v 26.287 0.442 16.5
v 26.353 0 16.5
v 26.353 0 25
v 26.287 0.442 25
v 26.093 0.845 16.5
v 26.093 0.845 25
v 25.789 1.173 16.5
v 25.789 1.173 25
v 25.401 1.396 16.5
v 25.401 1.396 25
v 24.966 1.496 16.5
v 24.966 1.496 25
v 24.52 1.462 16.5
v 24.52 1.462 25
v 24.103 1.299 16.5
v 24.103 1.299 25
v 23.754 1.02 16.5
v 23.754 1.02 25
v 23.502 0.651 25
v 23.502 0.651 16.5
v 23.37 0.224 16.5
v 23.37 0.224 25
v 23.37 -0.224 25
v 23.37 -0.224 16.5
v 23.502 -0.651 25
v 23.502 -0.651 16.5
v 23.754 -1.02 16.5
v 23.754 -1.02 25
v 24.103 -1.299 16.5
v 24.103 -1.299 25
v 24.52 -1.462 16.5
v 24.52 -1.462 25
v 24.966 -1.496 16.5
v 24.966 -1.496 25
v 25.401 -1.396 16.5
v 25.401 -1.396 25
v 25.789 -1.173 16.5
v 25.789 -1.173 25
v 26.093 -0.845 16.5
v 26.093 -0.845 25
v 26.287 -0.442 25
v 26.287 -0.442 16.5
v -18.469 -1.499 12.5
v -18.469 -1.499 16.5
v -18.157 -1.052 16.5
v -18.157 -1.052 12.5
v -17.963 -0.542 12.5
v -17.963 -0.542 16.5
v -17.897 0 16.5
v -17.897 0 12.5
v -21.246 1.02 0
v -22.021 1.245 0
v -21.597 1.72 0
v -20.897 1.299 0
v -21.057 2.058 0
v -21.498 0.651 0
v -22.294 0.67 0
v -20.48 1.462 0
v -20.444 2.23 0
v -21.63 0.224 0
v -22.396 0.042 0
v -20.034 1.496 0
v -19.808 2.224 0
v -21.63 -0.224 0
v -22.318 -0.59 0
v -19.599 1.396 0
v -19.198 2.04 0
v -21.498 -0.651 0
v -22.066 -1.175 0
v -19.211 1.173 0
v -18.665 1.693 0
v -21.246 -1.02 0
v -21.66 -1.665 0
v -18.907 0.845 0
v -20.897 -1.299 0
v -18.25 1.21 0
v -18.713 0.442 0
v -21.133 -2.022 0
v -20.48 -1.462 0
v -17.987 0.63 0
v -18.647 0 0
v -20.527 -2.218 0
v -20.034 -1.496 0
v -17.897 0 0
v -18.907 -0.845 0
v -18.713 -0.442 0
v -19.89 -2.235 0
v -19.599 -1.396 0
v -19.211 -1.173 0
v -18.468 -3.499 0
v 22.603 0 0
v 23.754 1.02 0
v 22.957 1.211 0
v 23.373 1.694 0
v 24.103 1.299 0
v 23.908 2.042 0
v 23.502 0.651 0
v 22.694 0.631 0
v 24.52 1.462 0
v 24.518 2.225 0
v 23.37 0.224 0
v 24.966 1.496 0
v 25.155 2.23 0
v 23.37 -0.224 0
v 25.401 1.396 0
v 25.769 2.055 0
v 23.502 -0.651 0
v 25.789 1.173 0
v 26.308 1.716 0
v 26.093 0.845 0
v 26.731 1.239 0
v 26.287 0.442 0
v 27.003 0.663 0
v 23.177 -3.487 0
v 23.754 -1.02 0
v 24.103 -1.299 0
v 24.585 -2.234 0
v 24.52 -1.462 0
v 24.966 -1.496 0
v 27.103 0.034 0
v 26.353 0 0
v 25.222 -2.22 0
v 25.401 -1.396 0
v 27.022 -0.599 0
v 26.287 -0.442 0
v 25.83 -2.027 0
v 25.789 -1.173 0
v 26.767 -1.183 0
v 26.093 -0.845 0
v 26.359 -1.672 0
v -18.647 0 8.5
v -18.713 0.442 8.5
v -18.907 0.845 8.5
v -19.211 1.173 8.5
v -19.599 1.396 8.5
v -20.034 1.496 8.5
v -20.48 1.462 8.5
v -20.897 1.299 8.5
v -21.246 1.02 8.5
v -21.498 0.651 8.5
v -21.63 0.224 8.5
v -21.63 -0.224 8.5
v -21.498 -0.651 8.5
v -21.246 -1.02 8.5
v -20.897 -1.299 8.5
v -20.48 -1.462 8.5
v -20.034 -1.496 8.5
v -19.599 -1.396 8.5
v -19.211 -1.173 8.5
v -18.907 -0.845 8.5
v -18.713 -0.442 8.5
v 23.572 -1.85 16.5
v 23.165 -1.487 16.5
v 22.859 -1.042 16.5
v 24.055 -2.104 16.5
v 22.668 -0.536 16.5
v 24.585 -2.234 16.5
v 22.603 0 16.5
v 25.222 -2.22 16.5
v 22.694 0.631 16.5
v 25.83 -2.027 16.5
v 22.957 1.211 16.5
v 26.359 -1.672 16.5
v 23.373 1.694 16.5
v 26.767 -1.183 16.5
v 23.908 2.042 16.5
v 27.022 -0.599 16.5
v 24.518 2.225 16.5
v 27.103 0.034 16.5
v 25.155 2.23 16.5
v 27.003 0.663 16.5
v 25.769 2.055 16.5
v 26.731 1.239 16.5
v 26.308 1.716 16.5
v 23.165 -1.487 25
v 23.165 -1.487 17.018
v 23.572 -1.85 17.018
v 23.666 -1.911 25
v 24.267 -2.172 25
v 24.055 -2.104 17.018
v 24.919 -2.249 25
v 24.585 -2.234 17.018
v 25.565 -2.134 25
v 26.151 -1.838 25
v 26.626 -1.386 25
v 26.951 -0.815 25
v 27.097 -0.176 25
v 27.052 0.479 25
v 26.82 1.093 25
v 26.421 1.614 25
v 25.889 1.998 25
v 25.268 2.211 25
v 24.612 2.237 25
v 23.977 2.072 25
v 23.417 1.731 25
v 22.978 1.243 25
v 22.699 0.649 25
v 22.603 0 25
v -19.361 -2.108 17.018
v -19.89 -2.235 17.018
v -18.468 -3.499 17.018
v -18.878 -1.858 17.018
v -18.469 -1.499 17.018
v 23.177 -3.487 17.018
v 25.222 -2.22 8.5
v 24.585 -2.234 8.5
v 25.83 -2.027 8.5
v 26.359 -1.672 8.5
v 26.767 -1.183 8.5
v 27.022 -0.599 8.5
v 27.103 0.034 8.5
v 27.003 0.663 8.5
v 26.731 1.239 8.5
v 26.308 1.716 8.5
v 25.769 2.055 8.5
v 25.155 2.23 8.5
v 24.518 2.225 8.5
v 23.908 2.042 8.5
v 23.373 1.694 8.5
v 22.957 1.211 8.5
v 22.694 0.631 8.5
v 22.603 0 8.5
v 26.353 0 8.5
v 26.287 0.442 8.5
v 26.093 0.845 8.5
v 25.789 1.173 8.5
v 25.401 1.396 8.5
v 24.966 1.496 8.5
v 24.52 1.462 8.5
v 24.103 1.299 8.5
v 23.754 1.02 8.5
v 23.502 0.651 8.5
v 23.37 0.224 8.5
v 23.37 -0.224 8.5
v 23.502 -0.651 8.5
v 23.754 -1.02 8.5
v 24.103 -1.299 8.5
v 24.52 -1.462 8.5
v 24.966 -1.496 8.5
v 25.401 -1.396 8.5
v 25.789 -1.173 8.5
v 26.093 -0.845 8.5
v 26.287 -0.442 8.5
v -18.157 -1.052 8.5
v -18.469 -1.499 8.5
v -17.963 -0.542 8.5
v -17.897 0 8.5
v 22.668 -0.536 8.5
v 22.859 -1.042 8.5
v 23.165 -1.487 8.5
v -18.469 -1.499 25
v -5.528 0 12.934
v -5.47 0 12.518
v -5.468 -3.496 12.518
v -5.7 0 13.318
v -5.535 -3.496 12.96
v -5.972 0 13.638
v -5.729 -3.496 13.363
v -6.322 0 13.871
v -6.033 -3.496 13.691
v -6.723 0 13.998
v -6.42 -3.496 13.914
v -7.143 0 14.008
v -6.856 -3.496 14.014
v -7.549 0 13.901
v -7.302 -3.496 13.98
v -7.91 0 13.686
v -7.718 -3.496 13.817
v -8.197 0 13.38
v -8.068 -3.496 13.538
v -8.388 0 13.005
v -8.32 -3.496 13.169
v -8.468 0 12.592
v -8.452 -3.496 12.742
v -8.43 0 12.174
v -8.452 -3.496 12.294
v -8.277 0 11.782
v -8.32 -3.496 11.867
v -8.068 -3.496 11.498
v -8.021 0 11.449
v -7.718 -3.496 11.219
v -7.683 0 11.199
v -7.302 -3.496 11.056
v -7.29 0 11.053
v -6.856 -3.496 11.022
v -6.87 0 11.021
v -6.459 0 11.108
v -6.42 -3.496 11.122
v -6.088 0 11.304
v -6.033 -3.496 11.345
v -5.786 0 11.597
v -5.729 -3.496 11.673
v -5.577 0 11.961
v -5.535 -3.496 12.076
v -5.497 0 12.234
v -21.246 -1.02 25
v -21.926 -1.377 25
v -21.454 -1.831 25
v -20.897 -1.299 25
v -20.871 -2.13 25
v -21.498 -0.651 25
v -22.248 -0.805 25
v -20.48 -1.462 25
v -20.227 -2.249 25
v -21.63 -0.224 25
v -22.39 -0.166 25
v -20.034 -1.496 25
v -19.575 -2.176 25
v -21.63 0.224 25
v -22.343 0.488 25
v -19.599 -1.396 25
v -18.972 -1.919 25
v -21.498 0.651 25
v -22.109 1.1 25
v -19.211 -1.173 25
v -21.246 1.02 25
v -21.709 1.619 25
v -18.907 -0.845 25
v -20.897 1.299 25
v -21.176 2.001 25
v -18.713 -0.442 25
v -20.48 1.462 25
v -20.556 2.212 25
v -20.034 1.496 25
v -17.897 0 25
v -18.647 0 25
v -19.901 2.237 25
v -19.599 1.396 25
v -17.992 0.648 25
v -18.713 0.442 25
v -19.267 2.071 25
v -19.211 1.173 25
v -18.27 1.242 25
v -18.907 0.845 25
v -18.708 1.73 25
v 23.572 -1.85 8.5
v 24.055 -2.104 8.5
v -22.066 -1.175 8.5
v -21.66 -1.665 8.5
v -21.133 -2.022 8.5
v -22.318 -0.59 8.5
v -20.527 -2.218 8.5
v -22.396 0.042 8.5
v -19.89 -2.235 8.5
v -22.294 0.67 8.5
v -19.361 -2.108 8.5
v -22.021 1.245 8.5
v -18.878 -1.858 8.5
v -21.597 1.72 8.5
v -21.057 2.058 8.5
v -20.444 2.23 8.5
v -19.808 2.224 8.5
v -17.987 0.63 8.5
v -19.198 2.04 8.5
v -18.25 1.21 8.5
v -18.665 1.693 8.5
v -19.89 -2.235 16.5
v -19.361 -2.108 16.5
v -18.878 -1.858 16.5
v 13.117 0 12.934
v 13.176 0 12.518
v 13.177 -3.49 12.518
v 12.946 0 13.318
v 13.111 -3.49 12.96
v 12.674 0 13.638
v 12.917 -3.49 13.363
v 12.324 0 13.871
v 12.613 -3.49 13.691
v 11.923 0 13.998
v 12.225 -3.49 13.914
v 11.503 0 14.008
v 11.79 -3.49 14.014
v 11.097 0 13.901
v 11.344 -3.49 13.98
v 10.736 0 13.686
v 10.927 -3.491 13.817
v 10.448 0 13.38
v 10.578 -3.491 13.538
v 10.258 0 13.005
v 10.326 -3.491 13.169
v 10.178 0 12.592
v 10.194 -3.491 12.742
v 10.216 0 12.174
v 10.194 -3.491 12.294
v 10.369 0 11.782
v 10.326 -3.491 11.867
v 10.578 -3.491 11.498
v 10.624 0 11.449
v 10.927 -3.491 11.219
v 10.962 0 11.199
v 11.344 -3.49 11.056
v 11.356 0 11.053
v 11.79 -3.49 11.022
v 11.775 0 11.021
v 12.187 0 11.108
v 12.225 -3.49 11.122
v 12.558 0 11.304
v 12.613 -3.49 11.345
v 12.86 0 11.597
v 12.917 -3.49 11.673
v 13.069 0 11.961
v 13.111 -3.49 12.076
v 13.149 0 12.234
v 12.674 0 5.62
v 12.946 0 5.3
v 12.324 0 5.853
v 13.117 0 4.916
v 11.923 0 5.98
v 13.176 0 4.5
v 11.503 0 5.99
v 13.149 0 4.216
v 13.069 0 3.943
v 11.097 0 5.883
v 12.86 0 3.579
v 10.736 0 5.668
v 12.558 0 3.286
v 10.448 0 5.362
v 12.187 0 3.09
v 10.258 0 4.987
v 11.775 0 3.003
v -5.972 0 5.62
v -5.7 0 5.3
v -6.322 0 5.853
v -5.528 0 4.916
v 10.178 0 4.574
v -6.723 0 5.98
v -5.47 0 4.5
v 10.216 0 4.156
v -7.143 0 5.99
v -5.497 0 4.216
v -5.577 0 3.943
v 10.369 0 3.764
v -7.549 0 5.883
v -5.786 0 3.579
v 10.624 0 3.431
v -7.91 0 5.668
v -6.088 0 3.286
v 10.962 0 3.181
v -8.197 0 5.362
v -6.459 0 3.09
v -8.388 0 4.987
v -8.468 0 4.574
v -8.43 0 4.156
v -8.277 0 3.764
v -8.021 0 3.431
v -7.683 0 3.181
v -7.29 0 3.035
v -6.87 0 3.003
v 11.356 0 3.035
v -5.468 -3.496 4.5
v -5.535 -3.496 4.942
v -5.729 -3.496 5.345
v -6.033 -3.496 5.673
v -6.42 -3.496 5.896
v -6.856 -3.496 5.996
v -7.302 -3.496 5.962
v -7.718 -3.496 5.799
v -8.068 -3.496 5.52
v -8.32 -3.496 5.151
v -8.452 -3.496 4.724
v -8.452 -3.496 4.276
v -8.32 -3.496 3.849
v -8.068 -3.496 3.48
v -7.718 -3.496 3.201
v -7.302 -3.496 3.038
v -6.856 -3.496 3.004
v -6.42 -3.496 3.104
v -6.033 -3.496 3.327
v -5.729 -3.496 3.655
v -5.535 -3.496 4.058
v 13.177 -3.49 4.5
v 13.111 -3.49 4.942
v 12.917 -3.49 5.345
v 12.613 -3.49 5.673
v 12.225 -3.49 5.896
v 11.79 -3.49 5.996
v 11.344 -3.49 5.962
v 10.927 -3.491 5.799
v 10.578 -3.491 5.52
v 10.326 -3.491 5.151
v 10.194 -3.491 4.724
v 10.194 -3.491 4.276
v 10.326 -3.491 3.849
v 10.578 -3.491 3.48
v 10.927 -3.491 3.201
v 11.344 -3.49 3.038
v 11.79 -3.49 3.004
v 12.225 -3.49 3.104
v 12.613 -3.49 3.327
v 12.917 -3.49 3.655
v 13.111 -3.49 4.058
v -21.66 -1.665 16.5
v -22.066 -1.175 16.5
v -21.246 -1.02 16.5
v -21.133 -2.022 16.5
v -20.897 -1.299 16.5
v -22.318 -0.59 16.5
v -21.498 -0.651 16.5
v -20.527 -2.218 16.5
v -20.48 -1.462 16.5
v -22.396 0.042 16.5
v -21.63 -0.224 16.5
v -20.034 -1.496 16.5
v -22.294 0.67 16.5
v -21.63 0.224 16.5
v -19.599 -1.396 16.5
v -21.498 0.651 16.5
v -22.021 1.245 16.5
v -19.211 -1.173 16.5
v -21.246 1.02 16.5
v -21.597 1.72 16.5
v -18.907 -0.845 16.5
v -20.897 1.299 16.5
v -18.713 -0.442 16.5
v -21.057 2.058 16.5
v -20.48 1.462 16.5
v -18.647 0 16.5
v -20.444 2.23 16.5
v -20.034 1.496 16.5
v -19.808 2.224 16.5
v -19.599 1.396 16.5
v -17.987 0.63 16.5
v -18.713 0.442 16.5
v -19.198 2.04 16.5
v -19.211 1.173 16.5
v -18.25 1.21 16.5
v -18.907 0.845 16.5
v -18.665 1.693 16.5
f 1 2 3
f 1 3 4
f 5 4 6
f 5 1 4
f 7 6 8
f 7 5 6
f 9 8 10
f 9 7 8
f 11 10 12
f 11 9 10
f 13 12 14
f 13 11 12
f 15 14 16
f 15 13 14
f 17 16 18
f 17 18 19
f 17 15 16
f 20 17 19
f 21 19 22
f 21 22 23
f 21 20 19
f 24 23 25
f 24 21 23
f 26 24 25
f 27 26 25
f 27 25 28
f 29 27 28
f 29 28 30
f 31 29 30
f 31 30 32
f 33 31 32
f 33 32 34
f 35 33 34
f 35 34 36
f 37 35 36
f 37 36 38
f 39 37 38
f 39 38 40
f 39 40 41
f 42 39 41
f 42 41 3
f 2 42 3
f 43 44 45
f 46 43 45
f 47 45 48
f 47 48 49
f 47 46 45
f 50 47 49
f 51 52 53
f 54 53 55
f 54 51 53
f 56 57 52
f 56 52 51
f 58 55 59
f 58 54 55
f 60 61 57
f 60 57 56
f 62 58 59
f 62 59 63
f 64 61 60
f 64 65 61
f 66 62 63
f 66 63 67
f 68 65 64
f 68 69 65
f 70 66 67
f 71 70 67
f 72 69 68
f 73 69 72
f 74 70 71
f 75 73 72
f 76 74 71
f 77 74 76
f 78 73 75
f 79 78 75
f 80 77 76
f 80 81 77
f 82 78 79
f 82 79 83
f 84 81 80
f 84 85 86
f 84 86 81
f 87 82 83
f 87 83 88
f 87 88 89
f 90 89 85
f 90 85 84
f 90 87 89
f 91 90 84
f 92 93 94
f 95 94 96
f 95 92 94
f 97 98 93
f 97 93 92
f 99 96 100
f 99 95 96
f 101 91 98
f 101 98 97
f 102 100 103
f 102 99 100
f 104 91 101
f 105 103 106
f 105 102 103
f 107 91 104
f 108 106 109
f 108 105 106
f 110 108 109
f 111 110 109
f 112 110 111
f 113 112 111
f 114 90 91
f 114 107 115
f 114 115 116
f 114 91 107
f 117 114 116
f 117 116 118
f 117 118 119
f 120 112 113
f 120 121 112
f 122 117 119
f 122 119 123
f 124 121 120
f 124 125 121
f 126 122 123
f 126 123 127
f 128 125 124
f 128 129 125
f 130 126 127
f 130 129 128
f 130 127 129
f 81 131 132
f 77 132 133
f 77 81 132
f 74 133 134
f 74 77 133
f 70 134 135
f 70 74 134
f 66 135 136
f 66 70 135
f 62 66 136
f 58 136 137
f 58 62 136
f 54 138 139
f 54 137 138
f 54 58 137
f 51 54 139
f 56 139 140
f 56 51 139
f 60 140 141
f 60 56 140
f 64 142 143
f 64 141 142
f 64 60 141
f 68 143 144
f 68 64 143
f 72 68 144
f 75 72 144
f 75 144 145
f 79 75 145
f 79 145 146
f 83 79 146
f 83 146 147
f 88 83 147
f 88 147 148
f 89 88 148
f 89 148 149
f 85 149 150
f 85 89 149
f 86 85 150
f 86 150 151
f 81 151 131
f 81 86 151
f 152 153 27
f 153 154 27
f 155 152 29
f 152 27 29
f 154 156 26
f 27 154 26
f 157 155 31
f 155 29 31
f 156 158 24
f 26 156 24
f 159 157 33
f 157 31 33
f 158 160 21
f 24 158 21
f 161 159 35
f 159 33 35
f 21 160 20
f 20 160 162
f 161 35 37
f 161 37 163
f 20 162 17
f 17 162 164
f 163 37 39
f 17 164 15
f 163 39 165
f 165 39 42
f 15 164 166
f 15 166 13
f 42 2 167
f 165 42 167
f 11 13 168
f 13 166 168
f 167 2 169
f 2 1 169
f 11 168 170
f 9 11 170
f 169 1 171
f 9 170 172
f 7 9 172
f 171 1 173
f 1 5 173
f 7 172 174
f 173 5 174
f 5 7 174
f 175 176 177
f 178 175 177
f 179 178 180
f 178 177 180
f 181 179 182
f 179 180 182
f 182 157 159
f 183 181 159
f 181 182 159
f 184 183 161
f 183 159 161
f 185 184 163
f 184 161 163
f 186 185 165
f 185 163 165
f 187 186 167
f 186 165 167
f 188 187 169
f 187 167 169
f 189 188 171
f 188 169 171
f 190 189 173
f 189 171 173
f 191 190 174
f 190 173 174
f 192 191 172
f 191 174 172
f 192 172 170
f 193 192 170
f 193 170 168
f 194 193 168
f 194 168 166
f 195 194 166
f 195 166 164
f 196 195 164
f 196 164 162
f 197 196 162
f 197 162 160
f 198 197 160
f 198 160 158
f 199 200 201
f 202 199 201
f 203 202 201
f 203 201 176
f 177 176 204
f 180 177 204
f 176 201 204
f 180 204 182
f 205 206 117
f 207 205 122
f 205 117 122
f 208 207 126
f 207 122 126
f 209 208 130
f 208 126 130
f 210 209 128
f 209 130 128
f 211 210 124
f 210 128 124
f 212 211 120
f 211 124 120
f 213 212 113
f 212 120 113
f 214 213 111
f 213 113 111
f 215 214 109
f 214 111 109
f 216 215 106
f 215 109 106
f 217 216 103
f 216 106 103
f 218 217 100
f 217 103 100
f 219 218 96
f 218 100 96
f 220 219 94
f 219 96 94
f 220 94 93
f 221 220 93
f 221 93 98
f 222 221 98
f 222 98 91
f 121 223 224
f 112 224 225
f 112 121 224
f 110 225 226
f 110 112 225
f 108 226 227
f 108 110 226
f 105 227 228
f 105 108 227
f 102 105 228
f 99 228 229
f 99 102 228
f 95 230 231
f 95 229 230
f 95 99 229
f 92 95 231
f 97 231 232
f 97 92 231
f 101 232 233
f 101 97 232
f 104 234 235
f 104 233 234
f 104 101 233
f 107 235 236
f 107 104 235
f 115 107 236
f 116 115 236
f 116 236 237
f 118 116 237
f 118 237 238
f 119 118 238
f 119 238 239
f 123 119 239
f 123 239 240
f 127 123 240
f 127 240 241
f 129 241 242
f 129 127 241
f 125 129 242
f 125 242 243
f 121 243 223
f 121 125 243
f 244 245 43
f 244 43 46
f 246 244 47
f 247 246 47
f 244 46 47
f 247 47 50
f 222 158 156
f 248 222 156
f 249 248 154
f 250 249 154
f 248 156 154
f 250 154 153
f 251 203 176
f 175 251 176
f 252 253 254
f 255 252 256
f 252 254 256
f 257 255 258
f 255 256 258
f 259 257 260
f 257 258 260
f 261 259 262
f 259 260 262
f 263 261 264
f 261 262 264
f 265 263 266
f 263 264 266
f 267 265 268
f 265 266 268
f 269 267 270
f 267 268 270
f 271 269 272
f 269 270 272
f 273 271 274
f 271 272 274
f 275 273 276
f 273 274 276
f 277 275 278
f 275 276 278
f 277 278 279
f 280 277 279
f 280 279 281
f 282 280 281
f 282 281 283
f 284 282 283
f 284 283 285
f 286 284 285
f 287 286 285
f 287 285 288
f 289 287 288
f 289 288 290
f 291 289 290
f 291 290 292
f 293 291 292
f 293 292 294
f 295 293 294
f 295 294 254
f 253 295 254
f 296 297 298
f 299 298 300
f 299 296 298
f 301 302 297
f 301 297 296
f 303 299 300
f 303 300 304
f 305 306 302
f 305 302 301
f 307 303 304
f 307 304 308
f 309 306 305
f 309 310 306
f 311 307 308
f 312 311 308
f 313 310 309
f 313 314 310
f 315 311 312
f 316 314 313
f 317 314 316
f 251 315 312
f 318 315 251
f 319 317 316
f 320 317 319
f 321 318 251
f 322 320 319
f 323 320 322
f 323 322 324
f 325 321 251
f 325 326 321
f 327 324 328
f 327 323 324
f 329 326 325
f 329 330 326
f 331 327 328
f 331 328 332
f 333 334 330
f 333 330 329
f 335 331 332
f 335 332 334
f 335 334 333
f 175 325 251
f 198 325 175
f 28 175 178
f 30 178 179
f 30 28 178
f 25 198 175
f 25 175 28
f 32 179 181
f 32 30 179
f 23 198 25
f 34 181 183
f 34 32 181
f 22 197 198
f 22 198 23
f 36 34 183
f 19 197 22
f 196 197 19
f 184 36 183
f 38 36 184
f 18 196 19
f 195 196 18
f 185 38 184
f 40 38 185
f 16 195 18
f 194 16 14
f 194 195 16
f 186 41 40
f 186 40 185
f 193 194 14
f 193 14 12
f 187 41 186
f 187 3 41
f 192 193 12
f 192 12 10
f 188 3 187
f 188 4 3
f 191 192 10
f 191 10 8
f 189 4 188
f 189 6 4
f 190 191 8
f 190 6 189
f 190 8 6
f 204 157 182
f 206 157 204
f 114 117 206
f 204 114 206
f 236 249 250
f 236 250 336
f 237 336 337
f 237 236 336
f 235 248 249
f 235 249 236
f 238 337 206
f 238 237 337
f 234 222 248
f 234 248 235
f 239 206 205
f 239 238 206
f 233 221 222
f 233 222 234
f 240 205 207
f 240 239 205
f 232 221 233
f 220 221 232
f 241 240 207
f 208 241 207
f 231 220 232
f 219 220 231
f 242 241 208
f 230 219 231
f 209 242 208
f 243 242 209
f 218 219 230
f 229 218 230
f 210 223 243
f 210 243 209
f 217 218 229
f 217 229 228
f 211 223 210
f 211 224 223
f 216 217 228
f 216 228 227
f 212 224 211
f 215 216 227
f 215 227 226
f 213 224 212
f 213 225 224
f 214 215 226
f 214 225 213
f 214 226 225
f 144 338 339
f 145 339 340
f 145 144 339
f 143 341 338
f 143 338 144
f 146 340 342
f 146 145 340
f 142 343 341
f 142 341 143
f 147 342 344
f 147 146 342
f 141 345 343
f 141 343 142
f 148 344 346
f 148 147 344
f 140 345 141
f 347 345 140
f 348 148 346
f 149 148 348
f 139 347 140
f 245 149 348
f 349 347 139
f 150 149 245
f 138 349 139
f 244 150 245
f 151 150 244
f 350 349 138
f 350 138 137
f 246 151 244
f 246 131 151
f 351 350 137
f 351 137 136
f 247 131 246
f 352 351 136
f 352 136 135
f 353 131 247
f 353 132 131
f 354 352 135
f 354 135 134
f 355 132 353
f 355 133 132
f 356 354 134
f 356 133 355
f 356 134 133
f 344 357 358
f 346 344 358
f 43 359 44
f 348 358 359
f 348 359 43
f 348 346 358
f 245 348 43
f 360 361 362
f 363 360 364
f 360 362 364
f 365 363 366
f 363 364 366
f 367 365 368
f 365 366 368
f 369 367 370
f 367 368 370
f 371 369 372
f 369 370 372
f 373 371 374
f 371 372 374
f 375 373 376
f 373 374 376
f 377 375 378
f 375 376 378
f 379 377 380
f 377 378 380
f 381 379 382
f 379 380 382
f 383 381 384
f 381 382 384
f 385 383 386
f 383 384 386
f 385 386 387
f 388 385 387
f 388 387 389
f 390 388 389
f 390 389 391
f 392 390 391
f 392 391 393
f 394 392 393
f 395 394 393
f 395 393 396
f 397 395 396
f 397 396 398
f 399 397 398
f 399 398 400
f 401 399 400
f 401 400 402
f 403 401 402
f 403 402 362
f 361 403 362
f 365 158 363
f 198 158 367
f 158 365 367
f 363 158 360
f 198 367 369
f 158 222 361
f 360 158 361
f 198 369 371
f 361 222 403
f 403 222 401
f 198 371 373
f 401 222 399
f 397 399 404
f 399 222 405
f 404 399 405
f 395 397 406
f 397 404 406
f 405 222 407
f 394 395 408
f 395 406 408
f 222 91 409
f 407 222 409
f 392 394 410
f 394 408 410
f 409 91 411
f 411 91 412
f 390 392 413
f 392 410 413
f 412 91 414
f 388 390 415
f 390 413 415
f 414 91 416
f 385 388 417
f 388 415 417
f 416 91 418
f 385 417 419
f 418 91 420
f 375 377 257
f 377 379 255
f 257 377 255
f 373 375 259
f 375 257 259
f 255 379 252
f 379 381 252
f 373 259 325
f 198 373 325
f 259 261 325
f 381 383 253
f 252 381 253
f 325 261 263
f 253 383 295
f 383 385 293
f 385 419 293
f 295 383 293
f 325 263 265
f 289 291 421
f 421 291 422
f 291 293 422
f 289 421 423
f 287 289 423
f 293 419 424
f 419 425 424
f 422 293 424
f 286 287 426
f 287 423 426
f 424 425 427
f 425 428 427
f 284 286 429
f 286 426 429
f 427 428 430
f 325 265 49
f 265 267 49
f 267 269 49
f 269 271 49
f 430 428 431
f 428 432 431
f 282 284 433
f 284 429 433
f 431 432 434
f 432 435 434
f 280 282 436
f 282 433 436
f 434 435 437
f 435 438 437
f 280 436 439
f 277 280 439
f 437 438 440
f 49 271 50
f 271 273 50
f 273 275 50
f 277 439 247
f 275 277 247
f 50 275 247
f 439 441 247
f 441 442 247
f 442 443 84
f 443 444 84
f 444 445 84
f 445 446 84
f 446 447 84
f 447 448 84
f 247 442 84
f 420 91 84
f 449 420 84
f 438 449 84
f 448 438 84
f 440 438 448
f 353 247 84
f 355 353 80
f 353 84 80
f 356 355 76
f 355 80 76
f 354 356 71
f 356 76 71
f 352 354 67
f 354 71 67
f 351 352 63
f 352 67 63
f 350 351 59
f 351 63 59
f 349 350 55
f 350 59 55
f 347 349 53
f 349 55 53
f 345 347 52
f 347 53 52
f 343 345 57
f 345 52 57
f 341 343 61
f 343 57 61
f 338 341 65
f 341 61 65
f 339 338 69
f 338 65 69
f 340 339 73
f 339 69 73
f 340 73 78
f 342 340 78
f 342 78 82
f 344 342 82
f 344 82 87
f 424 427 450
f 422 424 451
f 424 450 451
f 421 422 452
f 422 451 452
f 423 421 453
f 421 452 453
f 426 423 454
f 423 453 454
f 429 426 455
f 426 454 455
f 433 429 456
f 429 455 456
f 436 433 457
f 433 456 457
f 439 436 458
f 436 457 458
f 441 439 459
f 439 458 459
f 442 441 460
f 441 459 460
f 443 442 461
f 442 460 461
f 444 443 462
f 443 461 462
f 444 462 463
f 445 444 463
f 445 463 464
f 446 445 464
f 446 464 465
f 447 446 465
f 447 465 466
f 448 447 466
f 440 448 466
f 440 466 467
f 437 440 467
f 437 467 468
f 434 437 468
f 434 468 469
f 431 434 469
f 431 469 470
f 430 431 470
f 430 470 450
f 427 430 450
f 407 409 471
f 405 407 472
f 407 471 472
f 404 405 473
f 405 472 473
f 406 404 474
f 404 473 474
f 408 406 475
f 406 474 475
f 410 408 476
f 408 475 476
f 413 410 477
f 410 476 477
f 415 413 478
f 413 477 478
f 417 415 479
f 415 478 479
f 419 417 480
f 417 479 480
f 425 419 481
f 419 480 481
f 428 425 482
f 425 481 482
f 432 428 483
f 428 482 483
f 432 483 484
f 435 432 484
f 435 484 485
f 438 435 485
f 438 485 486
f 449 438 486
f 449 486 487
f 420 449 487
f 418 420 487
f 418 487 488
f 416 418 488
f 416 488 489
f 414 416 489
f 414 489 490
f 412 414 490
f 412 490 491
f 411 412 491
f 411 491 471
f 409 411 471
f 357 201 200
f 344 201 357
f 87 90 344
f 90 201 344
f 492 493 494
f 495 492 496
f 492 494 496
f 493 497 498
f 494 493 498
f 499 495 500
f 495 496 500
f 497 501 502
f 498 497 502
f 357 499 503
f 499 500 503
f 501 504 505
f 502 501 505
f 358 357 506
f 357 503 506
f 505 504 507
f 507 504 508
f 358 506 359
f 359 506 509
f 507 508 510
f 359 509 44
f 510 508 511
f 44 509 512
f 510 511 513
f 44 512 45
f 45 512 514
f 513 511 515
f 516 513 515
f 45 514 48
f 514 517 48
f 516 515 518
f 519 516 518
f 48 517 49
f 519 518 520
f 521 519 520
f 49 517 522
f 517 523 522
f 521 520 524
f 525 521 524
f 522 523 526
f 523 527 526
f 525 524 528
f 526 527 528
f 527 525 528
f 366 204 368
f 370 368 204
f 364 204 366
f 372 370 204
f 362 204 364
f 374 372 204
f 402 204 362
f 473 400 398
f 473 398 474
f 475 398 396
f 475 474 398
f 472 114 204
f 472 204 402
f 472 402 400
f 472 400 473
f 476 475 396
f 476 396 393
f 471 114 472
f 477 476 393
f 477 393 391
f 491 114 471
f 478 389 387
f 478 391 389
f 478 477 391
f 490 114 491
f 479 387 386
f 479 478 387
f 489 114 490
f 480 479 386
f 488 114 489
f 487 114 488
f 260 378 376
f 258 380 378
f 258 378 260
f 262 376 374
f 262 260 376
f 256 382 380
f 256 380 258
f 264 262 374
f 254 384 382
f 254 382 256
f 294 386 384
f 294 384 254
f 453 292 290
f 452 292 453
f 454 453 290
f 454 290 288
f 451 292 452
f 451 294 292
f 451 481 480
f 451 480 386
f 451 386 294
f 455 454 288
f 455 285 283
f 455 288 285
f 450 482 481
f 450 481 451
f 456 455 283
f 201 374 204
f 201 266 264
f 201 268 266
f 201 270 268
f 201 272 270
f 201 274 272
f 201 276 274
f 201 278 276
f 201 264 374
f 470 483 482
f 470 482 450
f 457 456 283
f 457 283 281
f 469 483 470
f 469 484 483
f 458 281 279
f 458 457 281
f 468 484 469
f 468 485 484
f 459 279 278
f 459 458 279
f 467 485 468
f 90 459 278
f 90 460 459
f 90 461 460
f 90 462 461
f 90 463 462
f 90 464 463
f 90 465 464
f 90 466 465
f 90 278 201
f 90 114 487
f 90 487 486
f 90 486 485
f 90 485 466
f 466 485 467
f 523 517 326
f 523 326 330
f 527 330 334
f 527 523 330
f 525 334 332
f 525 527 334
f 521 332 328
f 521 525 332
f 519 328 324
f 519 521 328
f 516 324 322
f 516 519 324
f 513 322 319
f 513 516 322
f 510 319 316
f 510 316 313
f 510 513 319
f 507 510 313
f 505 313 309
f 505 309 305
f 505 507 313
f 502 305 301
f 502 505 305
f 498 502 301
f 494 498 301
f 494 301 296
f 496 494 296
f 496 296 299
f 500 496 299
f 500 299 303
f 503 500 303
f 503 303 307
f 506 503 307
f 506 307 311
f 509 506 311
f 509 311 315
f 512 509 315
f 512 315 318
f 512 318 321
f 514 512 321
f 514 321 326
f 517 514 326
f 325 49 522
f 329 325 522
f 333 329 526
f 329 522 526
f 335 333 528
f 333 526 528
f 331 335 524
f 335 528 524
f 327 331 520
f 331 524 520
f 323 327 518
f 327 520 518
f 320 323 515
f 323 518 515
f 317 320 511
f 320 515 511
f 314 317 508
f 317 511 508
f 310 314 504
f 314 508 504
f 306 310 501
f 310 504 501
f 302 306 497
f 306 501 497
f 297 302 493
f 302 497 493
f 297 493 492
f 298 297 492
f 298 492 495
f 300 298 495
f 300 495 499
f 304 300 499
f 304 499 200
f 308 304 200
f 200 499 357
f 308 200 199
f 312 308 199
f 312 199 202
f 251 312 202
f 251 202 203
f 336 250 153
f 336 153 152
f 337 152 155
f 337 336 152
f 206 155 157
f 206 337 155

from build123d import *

# Parameters (mm, degrees)
F0_R          = 1.5
F1_DEPTH      = 25
F3_R          = 2.25
F4_DEPTH      = 4
F4_DEPTH_BACK = 4
F6_DEPTH      = 17.018
F7_R          = 1.5
F8_DEPTH      = 25.4


with BuildPart() as f1:
    # F0 (on Top) → F1 (new body)
    with BuildSketch(Plane.XY):
        with BuildLine():
            Line((22.603412069, 0), (-17.896587931, 0))
            ThreePointArc((-17.896587931, 0), (-22.2485975757, 0.8025306558), (-18.4690816674, -1.4994908255))
            Line((-18.4690816674, -1.4994908255), (23.1646932719, -1.4868519846))
            ThreePointArc((23.1646932719, -1.4868519846), (26.9584200611, 0.7946328418), (22.603412069, 0))
        make_face()
        with Locations((-20.146587931, 0)):
            Circle(F0_R, mode=Mode.SUBTRACT)
        with Locations((24.853412069, 0)):
            Circle(F0_R, mode=Mode.SUBTRACT)
    extrude(amount=F1_DEPTH)

    # F3 (on offset) → F4 (cut, two sides)
    with BuildSketch(Plane.XY.offset(12.5)) as f4_sk:
        with Locations((-20.146587931, 0)):
            Circle(F3_R)
        with Locations((24.853412069, 0)):
            Circle(F3_R)
    extrude(amount=-F4_DEPTH, mode=Mode.SUBTRACT)
    extrude(f4_sk.sketch, amount=F4_DEPTH_BACK, mode=Mode.SUBTRACT)

    # F5 (on face) → F6 (join)
    with BuildSketch(Plane(origin=(0, 0, 0), x_dir=(1, 0, 0), z_dir=(0, 0, -1))):
        with BuildLine():
            Line((24.5847299559, 2.2339001594), (23.1774195175, 3.4868482135))
            Line((23.1774195175, 3.4868482135), (-18.4684745238, 3.4994907333))
            Line((-18.4684745238, 3.4994907333), (-19.8901111496, 2.235334351))
            ThreePointArc((-19.8901111496, 2.235334351), (-19.1119676973, 1.9980142572), (-18.4690816674, 1.4994908255))
            Line((-18.4690816674, 1.4994908255), (23.1646932719, 1.4868519846))
            ThreePointArc((23.1646932719, 1.4868519846), (23.8058554716, 1.9912622066), (24.5847299559, 2.2339001594))
        make_face()
    extrude(amount=-F6_DEPTH)

    # F7 (on face) → F8 (cut)
    with BuildSketch(Plane(origin=(0.0010606447, -3.4938839029, 0), x_dir=(0.9999999539, 0.0003035718, 0), z_dir=(0.0003035718, -0.9999999539, 0))):
        with Locations((-6.9695360195, 12.518)):
            Circle(F7_R)
        with Locations((-6.9695360195, 4.5)):
            Circle(F7_R)
        with Locations((11.6763599407, 4.5)):
            Circle(F7_R)
        with Locations((11.6763599407, 12.518)):
            Circle(F7_R)
    extrude(amount=-F8_DEPTH, mode=Mode.SUBTRACT)


solid = f1.part
